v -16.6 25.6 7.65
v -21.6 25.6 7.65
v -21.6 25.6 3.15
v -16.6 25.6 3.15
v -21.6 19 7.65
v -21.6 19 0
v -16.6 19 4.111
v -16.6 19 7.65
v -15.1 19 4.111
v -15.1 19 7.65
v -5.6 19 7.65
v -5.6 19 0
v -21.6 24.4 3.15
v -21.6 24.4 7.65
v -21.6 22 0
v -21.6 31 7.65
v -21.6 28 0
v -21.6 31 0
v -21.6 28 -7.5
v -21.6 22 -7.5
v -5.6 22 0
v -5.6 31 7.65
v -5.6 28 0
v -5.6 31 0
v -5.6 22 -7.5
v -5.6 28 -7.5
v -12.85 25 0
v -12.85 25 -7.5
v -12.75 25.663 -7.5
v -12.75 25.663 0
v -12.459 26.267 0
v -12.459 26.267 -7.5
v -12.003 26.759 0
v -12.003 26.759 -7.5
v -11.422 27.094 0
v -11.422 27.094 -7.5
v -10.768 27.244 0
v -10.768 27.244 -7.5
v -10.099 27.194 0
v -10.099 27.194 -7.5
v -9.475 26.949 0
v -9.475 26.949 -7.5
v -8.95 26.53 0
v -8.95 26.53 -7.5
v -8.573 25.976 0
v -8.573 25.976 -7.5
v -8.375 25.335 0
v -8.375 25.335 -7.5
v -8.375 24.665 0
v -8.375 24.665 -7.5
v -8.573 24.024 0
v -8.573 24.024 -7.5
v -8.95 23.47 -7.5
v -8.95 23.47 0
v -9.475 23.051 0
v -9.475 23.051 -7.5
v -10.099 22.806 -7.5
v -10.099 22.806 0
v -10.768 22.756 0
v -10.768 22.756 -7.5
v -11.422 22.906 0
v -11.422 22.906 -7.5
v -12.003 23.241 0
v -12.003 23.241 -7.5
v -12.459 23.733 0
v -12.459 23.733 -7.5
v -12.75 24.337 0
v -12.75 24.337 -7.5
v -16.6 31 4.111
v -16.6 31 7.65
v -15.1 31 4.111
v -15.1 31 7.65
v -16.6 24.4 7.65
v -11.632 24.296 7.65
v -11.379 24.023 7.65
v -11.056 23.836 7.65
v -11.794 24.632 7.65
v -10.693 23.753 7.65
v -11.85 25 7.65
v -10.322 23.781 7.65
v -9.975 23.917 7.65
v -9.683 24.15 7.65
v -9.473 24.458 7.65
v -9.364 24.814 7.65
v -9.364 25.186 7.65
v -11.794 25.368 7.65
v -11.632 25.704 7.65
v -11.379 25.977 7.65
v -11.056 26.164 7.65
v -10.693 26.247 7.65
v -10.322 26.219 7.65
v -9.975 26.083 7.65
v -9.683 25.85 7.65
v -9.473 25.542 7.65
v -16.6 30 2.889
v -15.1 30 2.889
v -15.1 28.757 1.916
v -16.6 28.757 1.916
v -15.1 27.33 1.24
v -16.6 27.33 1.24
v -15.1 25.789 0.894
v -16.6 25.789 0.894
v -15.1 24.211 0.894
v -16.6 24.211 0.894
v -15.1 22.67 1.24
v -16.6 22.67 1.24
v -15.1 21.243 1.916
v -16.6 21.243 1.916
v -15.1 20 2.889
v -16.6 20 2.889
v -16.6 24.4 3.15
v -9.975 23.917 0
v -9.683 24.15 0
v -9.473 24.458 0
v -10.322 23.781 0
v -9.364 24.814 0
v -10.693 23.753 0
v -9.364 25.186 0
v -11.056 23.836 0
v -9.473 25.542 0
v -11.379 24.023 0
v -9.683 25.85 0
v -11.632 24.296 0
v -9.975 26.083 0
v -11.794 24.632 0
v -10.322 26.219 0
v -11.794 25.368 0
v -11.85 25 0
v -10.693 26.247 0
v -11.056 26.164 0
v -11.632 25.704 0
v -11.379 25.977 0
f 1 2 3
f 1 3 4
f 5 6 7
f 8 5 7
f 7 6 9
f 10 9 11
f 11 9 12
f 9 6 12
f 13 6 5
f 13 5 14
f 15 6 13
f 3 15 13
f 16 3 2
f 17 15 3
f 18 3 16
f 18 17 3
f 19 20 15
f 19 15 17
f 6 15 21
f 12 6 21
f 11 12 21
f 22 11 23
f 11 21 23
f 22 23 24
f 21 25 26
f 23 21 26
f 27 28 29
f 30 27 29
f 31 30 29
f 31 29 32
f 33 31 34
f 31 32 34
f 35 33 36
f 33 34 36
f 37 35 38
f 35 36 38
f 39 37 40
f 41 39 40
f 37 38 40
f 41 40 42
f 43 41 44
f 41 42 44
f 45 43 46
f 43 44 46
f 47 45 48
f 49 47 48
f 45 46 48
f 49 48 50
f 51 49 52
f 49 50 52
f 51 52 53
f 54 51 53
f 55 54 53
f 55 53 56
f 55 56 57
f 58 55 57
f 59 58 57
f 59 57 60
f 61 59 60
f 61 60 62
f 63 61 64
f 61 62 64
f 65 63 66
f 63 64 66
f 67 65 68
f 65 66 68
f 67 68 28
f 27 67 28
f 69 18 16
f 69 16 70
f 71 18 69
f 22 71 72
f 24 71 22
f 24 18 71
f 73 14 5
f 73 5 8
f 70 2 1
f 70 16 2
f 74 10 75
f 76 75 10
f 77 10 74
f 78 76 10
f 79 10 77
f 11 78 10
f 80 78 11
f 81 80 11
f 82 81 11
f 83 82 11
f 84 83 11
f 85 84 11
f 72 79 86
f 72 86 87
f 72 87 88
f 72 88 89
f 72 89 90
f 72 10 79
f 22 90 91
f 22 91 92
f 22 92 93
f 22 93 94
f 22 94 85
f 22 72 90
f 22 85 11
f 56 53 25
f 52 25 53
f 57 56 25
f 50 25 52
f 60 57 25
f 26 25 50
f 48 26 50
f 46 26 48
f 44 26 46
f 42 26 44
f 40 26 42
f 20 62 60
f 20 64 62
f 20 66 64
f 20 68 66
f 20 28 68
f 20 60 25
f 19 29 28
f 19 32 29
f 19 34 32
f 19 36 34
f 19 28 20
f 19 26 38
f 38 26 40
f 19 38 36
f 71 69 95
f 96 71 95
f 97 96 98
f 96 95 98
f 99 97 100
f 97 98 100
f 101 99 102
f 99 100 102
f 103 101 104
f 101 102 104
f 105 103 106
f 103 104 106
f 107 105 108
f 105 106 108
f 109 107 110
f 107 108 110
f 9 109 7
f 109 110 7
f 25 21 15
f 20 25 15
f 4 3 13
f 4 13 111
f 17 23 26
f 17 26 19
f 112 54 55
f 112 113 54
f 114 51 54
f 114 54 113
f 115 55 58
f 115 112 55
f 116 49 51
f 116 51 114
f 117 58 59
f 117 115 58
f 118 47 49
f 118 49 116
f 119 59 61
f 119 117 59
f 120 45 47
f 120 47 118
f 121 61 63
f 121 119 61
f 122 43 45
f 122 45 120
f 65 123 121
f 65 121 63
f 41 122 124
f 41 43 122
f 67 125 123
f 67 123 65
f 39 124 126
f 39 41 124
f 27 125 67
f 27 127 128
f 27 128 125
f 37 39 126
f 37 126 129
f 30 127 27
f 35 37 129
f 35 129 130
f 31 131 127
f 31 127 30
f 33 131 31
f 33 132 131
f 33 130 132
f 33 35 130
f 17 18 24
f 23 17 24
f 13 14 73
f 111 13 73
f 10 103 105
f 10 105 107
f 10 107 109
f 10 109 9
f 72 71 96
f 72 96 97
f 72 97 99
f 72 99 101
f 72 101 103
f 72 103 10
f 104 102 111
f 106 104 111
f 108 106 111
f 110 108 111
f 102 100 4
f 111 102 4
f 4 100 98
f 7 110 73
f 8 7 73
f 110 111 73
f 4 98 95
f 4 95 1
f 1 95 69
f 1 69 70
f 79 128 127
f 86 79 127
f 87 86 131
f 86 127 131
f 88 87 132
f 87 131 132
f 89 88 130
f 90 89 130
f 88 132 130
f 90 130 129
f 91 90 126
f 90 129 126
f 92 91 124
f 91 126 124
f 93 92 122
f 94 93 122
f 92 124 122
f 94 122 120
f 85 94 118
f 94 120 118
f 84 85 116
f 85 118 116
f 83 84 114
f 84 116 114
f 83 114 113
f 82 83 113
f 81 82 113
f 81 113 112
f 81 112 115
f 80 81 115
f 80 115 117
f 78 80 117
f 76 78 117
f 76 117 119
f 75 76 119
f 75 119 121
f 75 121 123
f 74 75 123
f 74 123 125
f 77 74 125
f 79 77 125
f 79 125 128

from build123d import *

# Parameters (mm, degrees)
SKETCH_1_W          = 16
SKETCH_1_H          = 12
EXTRUDE_1_DEPTH     = 7.65
SKETCH_2_W          = 5
SKETCH_2_H          = 1.2
CUT_EXTRUDE_1_DEPTH = 4.5
SKETCH_3_R          = 7.15
CUT_EXTRUDE_2_DEPTH = 1.5
SKETCH_4_W          = 16
SKETCH_4_H          = 6
EXTRUDE_2_DEPTH     = 7.5
SKETCH_5_R          = 2.25
CUT_EXTRUDE_3_DEPTH = 7.5
SKETCH_6_R          = 1.25
CUT_EXTRUDE_4_DEPTH = 8.65


with BuildPart() as part:
    # Эскиз1 → Бобышка-Вытянуть1 (new body)
    with BuildSketch(Plane.XY):
        with Locations((-13.599693696, 25)):
            Rectangle(SKETCH_1_W, SKETCH_1_H)
    extrude(amount=EXTRUDE_1_DEPTH)

    # Эскиз2 → Вырез-Вытянуть1 (cut)
    with BuildSketch(Plane.XY.offset(7.65)):
        with Locations((-19.099693696, 25)):
            Rectangle(SKETCH_2_W, SKETCH_2_H)
    extrude(amount=-CUT_EXTRUDE_1_DEPTH, mode=Mode.SUBTRACT)

    # Эскиз3 → Вырез-Вытянуть2 (cut)
    with BuildSketch(Plane.ZY.offset(16.599693696)):
        with Locations((8, 25)):
            Circle(SKETCH_3_R)
    extrude(amount=-CUT_EXTRUDE_2_DEPTH, mode=Mode.SUBTRACT)

    # Эскиз4 → Бобышка-Вытянуть2 (add)
    with BuildSketch(Plane(origin=(0, 0, 0), x_dir=(-1, 0, 0), z_dir=(0, 0, -1))):
        with Locations((13.599693696, 25)):
            Rectangle(SKETCH_4_W, SKETCH_4_H)
    extrude(amount=EXTRUDE_2_DEPTH)

    # Эскиз5 → Вырез-Вытянуть3 (cut)
    with BuildSketch(Plane(origin=(0, 0, -7.5), x_dir=(-1, 0, 0), z_dir=(0, 0, -1))):
        with Locations((10.599693696, 25)):
            Circle(SKETCH_5_R)
    extrude(amount=-CUT_EXTRUDE_3_DEPTH, mode=Mode.SUBTRACT)

    # Эскиз6 → Вырез-Вытянуть4 (cut, through all)
    with BuildSketch(Plane(origin=(0, 0, 0), x_dir=(-1, 0, 0), z_dir=(0, 0, -1))):
        with Locations((10.599693696, 25)):
            Circle(SKETCH_6_R)
    extrude(amount=-CUT_EXTRUDE_4_DEPTH, mode=Mode.SUBTRACT)


solid = part.part
